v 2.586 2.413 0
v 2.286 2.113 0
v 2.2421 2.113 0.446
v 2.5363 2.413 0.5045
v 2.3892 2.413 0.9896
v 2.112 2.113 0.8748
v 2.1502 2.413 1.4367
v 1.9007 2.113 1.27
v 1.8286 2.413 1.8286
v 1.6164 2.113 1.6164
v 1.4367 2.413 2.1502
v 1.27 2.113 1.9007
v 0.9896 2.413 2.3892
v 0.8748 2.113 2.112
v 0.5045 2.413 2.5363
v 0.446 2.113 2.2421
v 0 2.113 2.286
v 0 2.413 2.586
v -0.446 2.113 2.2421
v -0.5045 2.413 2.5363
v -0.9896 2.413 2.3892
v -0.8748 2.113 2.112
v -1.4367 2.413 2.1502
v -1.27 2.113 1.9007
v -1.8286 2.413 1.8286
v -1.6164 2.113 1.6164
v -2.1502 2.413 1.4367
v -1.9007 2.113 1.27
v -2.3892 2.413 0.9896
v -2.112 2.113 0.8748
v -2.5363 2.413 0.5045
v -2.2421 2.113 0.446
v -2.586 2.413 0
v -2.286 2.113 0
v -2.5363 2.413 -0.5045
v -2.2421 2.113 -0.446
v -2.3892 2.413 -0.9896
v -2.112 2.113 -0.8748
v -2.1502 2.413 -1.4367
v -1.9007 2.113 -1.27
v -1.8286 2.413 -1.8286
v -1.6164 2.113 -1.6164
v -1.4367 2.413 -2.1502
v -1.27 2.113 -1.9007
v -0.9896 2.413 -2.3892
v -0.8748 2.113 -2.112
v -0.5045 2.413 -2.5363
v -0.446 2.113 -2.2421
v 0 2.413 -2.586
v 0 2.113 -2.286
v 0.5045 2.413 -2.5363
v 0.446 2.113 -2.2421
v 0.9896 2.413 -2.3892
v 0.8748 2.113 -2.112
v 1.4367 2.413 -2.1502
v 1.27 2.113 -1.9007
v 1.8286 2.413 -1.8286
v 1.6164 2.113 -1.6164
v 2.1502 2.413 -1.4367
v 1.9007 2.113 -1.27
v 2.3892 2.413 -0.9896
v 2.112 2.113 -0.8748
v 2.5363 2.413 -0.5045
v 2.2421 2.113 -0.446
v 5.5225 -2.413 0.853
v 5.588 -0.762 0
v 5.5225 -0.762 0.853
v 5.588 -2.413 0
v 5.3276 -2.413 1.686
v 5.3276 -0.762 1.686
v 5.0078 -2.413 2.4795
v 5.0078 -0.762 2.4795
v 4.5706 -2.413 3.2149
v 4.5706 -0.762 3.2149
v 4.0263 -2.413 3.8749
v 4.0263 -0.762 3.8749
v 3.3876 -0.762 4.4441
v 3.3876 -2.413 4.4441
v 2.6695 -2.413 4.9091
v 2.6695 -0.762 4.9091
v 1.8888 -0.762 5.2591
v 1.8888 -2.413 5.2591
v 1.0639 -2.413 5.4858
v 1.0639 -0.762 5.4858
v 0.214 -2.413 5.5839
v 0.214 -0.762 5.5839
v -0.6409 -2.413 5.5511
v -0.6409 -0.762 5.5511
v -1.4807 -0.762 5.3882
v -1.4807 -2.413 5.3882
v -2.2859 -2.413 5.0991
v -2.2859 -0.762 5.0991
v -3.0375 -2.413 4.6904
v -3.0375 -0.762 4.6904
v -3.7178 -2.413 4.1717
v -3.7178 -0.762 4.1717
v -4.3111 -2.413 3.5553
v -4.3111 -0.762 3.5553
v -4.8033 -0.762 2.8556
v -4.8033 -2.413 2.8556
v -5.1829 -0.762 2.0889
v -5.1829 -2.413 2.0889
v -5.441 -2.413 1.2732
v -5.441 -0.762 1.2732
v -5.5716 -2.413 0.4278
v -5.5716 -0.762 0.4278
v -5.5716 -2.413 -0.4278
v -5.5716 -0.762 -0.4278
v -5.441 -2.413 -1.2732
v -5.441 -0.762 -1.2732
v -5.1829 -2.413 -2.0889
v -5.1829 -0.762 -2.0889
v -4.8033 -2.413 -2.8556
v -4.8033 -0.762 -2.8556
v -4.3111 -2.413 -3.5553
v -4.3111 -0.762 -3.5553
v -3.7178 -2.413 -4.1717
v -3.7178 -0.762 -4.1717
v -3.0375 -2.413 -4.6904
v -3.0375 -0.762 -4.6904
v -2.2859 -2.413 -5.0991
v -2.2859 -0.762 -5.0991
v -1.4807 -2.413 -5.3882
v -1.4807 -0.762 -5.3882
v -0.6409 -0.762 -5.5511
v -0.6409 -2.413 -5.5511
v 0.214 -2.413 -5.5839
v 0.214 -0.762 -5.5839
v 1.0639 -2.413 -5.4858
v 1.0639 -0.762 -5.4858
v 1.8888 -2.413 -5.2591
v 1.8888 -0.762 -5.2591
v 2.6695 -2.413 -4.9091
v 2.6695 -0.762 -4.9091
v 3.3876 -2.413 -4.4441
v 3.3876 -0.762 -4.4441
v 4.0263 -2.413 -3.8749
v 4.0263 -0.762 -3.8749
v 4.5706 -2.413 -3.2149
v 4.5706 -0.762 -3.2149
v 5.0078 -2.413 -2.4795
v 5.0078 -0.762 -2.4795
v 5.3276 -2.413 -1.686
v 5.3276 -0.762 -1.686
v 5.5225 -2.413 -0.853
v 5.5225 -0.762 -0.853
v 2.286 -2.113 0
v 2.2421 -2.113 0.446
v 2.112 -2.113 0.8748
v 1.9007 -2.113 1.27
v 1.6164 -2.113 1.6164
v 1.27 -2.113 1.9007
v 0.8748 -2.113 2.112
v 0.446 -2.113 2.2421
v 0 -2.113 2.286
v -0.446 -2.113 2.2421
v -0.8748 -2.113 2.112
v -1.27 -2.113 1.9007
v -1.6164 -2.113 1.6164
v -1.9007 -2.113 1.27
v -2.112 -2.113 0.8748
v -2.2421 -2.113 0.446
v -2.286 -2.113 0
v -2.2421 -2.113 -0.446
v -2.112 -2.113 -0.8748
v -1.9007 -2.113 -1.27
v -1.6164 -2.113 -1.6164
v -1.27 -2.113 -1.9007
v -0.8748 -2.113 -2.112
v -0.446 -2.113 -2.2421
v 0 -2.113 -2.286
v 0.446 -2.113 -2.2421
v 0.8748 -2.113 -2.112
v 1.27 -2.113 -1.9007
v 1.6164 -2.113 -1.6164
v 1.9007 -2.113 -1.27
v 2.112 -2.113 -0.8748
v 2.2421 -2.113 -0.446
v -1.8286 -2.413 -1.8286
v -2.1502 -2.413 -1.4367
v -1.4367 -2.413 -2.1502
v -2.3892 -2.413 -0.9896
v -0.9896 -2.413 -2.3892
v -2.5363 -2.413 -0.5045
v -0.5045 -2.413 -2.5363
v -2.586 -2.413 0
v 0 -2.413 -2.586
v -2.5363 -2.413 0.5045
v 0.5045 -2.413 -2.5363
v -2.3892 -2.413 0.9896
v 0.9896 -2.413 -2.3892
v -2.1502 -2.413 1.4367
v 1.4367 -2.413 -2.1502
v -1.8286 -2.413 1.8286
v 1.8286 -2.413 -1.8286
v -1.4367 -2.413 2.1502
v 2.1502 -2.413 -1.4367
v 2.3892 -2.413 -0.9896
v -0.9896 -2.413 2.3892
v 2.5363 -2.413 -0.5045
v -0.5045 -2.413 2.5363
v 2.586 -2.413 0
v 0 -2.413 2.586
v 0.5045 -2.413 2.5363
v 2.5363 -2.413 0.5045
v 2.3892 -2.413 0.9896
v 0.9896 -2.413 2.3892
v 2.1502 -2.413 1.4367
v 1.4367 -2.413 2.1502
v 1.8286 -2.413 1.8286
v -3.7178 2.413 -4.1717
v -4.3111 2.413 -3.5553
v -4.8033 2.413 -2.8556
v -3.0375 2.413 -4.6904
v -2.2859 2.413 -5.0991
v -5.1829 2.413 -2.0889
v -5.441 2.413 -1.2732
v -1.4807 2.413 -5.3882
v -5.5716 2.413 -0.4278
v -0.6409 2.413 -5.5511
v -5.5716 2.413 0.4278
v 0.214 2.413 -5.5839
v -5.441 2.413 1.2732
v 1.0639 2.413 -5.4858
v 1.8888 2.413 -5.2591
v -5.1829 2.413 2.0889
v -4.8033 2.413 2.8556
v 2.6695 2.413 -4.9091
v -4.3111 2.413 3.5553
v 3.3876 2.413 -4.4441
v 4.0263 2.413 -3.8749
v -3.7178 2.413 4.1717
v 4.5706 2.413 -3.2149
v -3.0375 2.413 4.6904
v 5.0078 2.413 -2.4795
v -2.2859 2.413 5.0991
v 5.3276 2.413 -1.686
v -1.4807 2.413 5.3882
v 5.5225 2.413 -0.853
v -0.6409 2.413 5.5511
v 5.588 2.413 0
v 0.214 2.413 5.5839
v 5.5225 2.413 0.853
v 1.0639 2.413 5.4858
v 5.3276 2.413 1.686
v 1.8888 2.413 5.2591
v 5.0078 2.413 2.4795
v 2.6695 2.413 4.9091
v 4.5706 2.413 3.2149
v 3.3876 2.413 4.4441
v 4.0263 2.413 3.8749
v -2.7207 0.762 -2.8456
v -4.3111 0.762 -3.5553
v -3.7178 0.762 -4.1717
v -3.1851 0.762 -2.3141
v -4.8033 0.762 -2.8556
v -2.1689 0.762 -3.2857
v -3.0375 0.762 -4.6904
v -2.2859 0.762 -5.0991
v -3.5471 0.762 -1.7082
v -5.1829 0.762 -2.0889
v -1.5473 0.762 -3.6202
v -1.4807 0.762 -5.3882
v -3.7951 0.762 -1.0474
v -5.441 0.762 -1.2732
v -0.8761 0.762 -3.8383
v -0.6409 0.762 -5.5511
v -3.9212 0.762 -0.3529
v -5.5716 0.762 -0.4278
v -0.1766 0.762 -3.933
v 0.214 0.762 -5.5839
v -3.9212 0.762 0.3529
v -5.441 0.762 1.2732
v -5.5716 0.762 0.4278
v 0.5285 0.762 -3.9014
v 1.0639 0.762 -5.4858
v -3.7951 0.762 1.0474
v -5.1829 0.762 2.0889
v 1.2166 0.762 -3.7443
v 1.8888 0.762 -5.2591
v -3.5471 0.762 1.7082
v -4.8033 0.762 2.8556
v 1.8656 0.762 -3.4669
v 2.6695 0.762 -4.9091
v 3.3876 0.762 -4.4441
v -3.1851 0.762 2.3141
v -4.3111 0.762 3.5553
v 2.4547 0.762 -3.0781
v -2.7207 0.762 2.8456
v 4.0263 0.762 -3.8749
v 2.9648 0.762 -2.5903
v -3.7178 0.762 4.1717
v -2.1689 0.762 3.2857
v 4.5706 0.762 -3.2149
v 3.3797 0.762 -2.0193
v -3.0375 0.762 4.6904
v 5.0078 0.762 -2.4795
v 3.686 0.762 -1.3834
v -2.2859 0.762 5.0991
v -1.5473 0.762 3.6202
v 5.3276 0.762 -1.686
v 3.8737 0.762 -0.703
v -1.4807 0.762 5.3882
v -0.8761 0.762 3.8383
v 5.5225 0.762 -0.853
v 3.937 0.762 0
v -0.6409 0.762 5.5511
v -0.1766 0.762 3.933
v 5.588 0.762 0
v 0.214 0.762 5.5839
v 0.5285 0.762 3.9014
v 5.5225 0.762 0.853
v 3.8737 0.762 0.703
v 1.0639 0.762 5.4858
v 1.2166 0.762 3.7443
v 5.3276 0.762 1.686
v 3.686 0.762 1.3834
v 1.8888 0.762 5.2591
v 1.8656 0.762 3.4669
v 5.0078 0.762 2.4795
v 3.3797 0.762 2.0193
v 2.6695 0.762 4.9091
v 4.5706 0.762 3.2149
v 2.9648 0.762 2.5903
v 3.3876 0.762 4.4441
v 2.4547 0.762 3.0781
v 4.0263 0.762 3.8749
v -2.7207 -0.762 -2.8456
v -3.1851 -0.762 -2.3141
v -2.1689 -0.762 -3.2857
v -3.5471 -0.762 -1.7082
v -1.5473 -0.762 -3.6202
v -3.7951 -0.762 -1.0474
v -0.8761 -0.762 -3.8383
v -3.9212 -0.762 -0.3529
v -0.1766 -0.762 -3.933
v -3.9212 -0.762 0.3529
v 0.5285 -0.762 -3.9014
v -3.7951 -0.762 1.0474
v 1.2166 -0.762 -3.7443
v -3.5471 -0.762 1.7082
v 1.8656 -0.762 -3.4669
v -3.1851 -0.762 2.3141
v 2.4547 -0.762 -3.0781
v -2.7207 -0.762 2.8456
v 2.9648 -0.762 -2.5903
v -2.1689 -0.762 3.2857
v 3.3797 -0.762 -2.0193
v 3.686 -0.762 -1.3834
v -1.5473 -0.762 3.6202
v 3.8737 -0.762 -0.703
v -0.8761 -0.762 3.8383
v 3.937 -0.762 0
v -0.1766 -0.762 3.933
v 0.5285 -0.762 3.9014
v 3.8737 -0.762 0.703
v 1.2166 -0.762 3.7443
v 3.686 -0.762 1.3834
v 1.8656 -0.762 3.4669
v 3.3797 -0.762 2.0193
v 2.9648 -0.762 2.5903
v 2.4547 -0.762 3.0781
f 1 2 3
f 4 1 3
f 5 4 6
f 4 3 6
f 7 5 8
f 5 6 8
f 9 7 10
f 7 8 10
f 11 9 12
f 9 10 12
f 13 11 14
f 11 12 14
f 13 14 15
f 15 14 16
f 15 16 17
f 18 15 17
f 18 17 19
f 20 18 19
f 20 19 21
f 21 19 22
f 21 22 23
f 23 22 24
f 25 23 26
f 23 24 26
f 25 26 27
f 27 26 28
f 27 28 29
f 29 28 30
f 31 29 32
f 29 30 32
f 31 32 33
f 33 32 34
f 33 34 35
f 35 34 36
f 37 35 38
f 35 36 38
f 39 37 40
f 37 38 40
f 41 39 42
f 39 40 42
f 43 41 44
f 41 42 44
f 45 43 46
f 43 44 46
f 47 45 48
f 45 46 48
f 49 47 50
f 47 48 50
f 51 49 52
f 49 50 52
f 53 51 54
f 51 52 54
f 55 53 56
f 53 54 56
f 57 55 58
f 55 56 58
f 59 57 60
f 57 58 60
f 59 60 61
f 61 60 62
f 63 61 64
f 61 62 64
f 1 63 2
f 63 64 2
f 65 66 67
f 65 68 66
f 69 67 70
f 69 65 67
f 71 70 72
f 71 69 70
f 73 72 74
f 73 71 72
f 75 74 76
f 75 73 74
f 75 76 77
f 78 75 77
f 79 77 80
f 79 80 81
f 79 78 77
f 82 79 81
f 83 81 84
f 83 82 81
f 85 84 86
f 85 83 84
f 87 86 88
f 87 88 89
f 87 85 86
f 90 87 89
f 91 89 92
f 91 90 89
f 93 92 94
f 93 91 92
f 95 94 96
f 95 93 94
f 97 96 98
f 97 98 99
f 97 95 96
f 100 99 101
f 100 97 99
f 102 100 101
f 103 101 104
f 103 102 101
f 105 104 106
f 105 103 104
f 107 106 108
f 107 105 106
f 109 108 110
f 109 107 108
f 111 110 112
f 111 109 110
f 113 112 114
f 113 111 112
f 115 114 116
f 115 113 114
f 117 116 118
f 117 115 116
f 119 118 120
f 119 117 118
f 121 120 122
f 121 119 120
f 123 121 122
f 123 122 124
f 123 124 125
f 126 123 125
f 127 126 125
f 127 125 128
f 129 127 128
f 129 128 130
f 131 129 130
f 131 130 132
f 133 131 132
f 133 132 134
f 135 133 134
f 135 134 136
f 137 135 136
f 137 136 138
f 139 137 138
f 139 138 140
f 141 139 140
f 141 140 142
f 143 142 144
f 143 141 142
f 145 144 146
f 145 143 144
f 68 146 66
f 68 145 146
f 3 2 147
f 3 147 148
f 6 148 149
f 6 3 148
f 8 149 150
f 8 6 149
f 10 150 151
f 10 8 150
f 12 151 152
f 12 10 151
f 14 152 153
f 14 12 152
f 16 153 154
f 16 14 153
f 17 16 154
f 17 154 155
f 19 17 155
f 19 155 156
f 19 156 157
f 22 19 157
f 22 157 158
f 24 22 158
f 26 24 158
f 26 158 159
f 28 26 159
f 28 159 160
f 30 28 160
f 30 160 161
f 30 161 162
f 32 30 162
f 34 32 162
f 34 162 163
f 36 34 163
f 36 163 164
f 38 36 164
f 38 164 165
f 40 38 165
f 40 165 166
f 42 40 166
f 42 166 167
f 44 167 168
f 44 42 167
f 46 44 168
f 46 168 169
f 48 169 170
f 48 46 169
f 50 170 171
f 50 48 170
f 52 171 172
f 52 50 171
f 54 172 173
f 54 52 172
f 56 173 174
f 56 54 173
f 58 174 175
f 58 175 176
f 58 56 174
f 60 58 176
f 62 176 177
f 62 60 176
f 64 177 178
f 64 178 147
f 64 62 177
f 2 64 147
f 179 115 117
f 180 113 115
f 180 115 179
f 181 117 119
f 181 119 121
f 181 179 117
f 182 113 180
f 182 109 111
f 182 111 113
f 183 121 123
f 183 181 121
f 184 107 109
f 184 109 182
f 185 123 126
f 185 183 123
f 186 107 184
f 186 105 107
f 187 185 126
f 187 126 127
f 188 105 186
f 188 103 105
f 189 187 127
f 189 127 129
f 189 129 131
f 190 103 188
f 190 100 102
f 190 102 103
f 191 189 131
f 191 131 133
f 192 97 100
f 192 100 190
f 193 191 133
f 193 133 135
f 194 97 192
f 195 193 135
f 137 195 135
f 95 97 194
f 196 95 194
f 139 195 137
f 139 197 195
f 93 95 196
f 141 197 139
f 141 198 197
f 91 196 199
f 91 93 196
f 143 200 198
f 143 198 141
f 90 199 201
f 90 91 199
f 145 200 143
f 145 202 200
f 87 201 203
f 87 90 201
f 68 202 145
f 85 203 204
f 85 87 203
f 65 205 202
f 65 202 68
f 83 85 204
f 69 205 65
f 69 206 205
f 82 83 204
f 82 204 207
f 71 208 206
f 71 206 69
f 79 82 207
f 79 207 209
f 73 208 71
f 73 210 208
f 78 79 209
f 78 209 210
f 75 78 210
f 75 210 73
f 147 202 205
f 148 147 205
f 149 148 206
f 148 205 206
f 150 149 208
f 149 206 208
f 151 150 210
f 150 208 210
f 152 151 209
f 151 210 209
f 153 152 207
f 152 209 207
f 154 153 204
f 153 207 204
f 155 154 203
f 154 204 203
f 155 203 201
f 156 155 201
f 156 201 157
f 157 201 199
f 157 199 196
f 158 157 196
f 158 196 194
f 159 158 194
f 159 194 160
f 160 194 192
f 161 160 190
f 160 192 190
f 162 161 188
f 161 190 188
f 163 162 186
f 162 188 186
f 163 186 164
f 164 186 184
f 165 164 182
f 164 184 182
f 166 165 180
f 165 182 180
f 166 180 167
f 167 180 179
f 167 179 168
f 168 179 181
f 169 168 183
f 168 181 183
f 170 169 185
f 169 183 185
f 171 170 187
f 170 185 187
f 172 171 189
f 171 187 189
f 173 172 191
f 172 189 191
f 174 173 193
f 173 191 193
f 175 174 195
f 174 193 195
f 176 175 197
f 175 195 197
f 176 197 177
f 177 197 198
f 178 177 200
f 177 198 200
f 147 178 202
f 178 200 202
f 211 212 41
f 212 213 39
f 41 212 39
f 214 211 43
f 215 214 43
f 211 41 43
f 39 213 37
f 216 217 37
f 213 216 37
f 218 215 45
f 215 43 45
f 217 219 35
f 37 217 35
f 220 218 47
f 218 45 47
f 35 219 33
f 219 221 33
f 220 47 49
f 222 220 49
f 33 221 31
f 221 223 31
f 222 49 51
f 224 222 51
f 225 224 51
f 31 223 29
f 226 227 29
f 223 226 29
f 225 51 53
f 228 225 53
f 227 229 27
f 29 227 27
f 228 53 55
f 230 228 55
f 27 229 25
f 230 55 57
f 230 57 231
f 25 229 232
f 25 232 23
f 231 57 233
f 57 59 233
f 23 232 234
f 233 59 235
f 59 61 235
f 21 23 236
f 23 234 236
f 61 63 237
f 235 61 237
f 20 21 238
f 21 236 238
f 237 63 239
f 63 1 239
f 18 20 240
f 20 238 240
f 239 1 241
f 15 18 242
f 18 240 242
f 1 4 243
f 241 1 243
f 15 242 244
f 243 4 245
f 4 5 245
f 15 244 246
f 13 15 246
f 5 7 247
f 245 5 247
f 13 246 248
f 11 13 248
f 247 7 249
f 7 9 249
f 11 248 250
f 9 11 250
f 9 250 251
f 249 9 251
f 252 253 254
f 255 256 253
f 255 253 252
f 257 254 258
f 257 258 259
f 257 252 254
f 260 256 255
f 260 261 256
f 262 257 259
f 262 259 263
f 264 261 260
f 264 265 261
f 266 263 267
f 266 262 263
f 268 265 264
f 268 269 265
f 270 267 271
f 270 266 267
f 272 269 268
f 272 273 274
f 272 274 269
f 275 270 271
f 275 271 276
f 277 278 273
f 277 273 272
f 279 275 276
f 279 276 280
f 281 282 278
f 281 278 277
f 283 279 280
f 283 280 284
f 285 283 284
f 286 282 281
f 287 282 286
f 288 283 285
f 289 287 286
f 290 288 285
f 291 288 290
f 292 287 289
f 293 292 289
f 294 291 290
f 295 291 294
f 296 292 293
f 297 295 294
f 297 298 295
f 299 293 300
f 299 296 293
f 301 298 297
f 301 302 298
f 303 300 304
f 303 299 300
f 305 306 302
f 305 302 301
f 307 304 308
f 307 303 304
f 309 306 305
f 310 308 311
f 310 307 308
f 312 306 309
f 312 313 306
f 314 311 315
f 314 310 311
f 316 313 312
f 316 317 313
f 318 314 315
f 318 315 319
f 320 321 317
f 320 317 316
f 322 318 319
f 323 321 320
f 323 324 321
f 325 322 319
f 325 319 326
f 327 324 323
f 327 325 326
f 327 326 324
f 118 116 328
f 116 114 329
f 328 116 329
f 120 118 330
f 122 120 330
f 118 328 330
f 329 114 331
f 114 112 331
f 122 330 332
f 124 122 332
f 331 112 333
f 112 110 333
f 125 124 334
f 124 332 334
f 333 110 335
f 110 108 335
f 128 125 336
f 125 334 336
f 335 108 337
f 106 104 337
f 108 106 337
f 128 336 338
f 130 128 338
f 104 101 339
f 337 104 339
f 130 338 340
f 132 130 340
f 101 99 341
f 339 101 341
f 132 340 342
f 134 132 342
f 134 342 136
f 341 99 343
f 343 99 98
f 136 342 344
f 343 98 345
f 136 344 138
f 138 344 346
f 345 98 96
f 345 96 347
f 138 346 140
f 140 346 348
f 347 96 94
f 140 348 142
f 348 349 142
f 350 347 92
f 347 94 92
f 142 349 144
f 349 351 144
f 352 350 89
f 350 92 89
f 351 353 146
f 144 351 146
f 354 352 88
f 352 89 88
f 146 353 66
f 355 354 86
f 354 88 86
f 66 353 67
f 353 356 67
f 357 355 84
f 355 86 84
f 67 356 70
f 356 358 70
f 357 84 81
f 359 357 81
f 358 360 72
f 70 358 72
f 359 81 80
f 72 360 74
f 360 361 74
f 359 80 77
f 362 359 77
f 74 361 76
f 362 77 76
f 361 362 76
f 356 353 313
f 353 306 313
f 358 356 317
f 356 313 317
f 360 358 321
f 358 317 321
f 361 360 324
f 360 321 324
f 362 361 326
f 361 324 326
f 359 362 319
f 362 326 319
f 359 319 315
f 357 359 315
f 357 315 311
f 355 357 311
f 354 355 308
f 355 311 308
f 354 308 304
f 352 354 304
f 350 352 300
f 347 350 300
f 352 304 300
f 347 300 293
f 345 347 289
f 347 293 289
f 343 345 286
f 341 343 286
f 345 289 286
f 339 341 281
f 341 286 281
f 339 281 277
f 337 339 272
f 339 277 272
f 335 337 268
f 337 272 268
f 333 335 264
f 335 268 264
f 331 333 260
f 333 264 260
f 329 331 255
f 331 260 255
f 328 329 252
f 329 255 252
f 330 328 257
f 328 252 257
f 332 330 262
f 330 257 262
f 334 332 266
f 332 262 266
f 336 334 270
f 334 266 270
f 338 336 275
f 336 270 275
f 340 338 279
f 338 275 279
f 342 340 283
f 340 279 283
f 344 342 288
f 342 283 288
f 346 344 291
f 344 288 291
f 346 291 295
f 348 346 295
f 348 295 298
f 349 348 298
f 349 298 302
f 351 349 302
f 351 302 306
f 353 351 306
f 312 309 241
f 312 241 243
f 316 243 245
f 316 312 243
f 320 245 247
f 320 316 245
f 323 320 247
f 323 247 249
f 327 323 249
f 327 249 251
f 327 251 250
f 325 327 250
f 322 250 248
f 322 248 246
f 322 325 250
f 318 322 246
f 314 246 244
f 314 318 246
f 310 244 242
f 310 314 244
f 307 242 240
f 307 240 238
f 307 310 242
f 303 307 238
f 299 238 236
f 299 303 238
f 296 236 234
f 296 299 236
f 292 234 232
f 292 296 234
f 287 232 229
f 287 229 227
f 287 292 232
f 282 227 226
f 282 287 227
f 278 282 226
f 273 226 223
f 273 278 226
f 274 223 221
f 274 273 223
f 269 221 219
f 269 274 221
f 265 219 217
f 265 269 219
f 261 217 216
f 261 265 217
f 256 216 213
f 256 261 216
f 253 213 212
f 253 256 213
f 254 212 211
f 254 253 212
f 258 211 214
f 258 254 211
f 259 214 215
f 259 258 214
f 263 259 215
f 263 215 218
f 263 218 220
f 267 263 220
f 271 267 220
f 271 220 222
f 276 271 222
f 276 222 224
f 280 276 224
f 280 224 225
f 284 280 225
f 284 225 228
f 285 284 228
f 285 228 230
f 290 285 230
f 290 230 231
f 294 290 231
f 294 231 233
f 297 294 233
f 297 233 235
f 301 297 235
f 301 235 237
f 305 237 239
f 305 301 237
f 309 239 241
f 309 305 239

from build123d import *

# Parameters (mm, degrees)
F0_R     = 5.588
F0_R_2   = 3.937
F0_R_3   = 2.286
F1_DEPTH = 2.413
F2_DEPTH = 0.762
F3_SIZE  = 0.3


with BuildPart() as f1:
    # F0 (on Front) → F1 (new body, symmetric)
    with BuildSketch(Plane.XZ):
        Circle(F0_R)
        Circle(F0_R_2, mode=Mode.SUBTRACT)
        Circle(F0_R_2)
        Circle(F0_R_3, mode=Mode.SUBTRACT)
    extrude(amount=F1_DEPTH, both=True)

    # F0 (on Front) → F2 (cut, symmetric)
    with BuildSketch(Plane.XZ):
        Circle(F0_R)
        Circle(F0_R_2, mode=Mode.SUBTRACT)
    extrude(amount=F2_DEPTH, both=True, mode=Mode.SUBTRACT)

    # F3
    f3_edges = [f1.edges().sort_by_distance(p)[0] for p in [
        (-2.286, -2.413, 0),
        (-2.286, 2.413, 0),
    ]]
    chamfer(f3_edges, length=F3_SIZE)


solid = f1.part
